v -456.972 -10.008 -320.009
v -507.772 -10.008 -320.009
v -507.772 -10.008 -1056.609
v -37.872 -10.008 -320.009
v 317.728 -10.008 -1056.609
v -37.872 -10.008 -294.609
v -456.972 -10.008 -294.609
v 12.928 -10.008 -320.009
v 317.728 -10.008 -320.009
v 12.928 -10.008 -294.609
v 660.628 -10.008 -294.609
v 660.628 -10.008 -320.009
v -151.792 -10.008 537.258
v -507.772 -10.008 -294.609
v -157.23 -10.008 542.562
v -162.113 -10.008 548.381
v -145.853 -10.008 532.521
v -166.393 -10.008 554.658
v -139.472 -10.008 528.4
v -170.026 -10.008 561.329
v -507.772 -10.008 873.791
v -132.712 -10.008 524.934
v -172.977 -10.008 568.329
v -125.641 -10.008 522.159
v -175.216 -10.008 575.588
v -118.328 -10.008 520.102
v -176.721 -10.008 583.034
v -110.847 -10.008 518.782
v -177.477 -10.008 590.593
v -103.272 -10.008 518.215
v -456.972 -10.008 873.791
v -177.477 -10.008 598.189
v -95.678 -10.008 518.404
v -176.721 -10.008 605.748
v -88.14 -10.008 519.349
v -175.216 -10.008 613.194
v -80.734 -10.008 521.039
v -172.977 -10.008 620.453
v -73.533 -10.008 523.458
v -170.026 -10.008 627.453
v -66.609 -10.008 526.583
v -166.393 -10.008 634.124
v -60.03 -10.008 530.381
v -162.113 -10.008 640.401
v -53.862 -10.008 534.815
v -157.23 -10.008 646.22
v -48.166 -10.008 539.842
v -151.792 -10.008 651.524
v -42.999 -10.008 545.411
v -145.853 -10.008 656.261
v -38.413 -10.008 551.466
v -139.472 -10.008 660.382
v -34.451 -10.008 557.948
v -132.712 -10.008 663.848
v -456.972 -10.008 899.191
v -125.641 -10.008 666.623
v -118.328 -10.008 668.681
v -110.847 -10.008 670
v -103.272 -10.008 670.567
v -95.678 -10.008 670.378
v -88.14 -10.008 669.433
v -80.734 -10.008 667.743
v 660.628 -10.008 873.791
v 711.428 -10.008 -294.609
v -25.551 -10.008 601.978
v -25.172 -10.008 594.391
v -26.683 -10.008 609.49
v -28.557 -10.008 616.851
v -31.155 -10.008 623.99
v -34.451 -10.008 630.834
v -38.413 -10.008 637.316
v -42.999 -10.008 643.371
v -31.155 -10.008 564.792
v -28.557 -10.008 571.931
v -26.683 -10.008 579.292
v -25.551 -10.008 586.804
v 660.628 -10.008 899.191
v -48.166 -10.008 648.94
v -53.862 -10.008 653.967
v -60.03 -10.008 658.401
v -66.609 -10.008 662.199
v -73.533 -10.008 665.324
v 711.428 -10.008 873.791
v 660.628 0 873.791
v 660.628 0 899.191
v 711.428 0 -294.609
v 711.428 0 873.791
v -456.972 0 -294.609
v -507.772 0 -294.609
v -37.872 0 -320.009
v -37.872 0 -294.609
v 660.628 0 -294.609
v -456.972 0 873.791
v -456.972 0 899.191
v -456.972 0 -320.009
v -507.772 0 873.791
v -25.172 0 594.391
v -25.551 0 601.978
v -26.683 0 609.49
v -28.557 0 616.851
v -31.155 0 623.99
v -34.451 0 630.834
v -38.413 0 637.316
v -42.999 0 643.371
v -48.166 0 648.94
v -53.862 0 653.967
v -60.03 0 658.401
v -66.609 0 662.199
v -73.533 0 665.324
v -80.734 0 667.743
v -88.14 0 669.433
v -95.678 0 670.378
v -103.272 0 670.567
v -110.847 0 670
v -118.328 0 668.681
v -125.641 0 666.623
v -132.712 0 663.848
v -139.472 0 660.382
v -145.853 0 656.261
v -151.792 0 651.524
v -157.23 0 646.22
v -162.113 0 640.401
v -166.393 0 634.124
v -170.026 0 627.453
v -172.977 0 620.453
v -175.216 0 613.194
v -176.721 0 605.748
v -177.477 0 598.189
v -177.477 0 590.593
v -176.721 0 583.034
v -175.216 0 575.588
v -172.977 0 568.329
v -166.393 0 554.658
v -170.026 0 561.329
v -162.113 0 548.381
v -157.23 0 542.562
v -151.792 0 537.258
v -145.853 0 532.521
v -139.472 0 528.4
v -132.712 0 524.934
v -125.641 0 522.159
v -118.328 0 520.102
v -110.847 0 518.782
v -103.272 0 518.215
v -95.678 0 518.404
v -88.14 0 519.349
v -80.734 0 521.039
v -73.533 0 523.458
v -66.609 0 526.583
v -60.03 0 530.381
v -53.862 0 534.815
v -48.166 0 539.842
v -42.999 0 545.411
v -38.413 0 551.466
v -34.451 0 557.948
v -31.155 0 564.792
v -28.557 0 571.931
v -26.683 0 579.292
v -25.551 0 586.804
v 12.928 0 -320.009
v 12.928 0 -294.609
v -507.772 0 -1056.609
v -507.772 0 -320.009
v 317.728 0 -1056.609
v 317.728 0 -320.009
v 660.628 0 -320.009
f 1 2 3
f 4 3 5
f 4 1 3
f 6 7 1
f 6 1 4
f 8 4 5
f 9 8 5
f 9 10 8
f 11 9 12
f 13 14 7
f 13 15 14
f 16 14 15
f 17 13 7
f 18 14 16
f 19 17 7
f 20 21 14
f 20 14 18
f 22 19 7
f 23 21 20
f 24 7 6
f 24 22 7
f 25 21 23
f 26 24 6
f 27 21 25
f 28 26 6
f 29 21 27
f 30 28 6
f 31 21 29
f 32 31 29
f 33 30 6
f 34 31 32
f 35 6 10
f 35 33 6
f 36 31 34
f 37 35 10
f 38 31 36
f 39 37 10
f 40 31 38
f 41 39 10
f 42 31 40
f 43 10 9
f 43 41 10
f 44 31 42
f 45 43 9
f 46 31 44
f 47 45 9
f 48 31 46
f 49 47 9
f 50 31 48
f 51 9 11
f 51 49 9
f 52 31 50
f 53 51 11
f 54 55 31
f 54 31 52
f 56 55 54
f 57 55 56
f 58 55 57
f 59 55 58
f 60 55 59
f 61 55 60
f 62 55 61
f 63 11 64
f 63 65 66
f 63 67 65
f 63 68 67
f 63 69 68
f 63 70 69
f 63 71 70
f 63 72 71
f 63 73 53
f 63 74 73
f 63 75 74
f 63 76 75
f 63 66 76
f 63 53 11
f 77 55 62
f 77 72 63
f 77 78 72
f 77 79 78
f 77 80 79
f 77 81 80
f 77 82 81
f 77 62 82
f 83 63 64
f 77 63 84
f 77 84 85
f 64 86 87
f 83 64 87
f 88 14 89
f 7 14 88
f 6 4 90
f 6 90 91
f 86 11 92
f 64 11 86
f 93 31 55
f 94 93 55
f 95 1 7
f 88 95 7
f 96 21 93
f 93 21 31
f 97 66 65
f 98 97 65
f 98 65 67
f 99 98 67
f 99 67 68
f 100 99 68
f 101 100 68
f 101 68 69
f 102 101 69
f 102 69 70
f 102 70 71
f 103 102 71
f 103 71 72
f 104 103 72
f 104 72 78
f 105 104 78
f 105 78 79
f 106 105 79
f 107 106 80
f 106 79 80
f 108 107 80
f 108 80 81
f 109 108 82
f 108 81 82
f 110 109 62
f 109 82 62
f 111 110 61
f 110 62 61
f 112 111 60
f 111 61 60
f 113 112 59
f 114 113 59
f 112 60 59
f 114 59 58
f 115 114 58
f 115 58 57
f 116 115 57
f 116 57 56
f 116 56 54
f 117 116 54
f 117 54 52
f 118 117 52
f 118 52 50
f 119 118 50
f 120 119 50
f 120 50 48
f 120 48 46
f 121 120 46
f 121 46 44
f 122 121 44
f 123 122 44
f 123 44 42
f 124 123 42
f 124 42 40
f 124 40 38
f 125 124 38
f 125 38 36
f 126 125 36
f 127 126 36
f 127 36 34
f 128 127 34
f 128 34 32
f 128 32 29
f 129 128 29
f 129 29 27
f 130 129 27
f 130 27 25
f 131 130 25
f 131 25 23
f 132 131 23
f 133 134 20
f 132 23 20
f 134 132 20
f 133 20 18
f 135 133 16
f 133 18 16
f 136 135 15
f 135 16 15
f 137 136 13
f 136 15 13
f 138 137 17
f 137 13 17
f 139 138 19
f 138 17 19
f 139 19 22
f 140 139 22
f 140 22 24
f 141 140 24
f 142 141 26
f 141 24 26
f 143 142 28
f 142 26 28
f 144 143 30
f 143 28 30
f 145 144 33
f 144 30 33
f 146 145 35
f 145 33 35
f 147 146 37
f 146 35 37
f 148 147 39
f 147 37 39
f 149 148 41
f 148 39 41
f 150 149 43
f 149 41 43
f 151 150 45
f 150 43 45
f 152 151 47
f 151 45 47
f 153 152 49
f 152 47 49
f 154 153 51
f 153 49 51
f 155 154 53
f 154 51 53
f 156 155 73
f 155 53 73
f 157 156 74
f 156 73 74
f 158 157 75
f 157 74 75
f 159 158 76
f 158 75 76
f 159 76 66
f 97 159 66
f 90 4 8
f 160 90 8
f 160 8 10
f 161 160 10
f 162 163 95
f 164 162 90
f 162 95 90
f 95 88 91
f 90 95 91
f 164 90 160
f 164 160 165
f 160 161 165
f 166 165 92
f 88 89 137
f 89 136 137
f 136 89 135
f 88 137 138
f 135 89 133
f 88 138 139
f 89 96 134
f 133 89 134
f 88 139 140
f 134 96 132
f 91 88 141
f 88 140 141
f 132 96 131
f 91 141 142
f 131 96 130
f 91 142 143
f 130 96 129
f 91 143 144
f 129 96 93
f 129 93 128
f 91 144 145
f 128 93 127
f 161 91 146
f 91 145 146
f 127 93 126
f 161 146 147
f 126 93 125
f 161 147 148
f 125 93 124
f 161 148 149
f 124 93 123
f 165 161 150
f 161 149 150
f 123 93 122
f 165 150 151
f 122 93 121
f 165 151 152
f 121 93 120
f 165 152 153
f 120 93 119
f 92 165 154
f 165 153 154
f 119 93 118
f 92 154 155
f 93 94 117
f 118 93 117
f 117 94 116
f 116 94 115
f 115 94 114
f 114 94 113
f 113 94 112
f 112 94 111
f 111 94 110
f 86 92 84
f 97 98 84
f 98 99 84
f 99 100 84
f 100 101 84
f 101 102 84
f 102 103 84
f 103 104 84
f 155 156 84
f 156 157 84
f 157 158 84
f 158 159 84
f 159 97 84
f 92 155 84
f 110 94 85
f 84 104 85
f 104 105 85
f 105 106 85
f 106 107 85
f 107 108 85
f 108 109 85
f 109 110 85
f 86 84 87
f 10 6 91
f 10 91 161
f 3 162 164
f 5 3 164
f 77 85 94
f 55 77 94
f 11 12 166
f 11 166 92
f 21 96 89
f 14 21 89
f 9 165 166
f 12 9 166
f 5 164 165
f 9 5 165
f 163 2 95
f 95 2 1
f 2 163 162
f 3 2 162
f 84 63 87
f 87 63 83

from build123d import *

# Parameters (mm, degrees)
F1_DEPTH = 10.0076
F2_W     = 50.8
F2_H     = 25.4
F3_DEPTH = 10.0086
F4_R     = 76.2
F5_DEPTH = 10.0086


with BuildPart() as f1:
    # F0 (on Front) → F1 (new body)
    with BuildSketch(Plane.XZ):
        Polygon((711.428056, 899.191029), (-507.771944, 899.191029), (-507.771944, -1056.608971), (317.728056, -1056.608971), (317.728056, -320.008971), (711.428056, -320.008971), align=None)
    extrude(amount=F1_DEPTH)

    # F2 (on face) → F3 (cut, through all)
    with BuildSketch(Plane.XZ.offset(10.0076)):
        with Locations((686.028056, 886.491029)):
            Rectangle(F2_W, F2_H)
        with Locations((-482.371944, 886.491029)):
            Rectangle(F2_W, F2_H)
        with Locations((686.028056, -307.308971)):
            Rectangle(F2_W, F2_H)
        with Locations((-482.371944, -307.308971)):
            Rectangle(F2_W, F2_H)
        with Locations((-12.471944, -307.308971)):
            Rectangle(F2_W, F2_H)
    extrude(amount=-F3_DEPTH, mode=Mode.SUBTRACT)

    # F4 (on face) → F5 (cut, through all)
    with BuildSketch(Plane.XZ.offset(10.0076)):
        with Locations((-101.371944, 594.391029)):
            Circle(F4_R)
    extrude(amount=-F5_DEPTH, mode=Mode.SUBTRACT)


solid = f1.part
